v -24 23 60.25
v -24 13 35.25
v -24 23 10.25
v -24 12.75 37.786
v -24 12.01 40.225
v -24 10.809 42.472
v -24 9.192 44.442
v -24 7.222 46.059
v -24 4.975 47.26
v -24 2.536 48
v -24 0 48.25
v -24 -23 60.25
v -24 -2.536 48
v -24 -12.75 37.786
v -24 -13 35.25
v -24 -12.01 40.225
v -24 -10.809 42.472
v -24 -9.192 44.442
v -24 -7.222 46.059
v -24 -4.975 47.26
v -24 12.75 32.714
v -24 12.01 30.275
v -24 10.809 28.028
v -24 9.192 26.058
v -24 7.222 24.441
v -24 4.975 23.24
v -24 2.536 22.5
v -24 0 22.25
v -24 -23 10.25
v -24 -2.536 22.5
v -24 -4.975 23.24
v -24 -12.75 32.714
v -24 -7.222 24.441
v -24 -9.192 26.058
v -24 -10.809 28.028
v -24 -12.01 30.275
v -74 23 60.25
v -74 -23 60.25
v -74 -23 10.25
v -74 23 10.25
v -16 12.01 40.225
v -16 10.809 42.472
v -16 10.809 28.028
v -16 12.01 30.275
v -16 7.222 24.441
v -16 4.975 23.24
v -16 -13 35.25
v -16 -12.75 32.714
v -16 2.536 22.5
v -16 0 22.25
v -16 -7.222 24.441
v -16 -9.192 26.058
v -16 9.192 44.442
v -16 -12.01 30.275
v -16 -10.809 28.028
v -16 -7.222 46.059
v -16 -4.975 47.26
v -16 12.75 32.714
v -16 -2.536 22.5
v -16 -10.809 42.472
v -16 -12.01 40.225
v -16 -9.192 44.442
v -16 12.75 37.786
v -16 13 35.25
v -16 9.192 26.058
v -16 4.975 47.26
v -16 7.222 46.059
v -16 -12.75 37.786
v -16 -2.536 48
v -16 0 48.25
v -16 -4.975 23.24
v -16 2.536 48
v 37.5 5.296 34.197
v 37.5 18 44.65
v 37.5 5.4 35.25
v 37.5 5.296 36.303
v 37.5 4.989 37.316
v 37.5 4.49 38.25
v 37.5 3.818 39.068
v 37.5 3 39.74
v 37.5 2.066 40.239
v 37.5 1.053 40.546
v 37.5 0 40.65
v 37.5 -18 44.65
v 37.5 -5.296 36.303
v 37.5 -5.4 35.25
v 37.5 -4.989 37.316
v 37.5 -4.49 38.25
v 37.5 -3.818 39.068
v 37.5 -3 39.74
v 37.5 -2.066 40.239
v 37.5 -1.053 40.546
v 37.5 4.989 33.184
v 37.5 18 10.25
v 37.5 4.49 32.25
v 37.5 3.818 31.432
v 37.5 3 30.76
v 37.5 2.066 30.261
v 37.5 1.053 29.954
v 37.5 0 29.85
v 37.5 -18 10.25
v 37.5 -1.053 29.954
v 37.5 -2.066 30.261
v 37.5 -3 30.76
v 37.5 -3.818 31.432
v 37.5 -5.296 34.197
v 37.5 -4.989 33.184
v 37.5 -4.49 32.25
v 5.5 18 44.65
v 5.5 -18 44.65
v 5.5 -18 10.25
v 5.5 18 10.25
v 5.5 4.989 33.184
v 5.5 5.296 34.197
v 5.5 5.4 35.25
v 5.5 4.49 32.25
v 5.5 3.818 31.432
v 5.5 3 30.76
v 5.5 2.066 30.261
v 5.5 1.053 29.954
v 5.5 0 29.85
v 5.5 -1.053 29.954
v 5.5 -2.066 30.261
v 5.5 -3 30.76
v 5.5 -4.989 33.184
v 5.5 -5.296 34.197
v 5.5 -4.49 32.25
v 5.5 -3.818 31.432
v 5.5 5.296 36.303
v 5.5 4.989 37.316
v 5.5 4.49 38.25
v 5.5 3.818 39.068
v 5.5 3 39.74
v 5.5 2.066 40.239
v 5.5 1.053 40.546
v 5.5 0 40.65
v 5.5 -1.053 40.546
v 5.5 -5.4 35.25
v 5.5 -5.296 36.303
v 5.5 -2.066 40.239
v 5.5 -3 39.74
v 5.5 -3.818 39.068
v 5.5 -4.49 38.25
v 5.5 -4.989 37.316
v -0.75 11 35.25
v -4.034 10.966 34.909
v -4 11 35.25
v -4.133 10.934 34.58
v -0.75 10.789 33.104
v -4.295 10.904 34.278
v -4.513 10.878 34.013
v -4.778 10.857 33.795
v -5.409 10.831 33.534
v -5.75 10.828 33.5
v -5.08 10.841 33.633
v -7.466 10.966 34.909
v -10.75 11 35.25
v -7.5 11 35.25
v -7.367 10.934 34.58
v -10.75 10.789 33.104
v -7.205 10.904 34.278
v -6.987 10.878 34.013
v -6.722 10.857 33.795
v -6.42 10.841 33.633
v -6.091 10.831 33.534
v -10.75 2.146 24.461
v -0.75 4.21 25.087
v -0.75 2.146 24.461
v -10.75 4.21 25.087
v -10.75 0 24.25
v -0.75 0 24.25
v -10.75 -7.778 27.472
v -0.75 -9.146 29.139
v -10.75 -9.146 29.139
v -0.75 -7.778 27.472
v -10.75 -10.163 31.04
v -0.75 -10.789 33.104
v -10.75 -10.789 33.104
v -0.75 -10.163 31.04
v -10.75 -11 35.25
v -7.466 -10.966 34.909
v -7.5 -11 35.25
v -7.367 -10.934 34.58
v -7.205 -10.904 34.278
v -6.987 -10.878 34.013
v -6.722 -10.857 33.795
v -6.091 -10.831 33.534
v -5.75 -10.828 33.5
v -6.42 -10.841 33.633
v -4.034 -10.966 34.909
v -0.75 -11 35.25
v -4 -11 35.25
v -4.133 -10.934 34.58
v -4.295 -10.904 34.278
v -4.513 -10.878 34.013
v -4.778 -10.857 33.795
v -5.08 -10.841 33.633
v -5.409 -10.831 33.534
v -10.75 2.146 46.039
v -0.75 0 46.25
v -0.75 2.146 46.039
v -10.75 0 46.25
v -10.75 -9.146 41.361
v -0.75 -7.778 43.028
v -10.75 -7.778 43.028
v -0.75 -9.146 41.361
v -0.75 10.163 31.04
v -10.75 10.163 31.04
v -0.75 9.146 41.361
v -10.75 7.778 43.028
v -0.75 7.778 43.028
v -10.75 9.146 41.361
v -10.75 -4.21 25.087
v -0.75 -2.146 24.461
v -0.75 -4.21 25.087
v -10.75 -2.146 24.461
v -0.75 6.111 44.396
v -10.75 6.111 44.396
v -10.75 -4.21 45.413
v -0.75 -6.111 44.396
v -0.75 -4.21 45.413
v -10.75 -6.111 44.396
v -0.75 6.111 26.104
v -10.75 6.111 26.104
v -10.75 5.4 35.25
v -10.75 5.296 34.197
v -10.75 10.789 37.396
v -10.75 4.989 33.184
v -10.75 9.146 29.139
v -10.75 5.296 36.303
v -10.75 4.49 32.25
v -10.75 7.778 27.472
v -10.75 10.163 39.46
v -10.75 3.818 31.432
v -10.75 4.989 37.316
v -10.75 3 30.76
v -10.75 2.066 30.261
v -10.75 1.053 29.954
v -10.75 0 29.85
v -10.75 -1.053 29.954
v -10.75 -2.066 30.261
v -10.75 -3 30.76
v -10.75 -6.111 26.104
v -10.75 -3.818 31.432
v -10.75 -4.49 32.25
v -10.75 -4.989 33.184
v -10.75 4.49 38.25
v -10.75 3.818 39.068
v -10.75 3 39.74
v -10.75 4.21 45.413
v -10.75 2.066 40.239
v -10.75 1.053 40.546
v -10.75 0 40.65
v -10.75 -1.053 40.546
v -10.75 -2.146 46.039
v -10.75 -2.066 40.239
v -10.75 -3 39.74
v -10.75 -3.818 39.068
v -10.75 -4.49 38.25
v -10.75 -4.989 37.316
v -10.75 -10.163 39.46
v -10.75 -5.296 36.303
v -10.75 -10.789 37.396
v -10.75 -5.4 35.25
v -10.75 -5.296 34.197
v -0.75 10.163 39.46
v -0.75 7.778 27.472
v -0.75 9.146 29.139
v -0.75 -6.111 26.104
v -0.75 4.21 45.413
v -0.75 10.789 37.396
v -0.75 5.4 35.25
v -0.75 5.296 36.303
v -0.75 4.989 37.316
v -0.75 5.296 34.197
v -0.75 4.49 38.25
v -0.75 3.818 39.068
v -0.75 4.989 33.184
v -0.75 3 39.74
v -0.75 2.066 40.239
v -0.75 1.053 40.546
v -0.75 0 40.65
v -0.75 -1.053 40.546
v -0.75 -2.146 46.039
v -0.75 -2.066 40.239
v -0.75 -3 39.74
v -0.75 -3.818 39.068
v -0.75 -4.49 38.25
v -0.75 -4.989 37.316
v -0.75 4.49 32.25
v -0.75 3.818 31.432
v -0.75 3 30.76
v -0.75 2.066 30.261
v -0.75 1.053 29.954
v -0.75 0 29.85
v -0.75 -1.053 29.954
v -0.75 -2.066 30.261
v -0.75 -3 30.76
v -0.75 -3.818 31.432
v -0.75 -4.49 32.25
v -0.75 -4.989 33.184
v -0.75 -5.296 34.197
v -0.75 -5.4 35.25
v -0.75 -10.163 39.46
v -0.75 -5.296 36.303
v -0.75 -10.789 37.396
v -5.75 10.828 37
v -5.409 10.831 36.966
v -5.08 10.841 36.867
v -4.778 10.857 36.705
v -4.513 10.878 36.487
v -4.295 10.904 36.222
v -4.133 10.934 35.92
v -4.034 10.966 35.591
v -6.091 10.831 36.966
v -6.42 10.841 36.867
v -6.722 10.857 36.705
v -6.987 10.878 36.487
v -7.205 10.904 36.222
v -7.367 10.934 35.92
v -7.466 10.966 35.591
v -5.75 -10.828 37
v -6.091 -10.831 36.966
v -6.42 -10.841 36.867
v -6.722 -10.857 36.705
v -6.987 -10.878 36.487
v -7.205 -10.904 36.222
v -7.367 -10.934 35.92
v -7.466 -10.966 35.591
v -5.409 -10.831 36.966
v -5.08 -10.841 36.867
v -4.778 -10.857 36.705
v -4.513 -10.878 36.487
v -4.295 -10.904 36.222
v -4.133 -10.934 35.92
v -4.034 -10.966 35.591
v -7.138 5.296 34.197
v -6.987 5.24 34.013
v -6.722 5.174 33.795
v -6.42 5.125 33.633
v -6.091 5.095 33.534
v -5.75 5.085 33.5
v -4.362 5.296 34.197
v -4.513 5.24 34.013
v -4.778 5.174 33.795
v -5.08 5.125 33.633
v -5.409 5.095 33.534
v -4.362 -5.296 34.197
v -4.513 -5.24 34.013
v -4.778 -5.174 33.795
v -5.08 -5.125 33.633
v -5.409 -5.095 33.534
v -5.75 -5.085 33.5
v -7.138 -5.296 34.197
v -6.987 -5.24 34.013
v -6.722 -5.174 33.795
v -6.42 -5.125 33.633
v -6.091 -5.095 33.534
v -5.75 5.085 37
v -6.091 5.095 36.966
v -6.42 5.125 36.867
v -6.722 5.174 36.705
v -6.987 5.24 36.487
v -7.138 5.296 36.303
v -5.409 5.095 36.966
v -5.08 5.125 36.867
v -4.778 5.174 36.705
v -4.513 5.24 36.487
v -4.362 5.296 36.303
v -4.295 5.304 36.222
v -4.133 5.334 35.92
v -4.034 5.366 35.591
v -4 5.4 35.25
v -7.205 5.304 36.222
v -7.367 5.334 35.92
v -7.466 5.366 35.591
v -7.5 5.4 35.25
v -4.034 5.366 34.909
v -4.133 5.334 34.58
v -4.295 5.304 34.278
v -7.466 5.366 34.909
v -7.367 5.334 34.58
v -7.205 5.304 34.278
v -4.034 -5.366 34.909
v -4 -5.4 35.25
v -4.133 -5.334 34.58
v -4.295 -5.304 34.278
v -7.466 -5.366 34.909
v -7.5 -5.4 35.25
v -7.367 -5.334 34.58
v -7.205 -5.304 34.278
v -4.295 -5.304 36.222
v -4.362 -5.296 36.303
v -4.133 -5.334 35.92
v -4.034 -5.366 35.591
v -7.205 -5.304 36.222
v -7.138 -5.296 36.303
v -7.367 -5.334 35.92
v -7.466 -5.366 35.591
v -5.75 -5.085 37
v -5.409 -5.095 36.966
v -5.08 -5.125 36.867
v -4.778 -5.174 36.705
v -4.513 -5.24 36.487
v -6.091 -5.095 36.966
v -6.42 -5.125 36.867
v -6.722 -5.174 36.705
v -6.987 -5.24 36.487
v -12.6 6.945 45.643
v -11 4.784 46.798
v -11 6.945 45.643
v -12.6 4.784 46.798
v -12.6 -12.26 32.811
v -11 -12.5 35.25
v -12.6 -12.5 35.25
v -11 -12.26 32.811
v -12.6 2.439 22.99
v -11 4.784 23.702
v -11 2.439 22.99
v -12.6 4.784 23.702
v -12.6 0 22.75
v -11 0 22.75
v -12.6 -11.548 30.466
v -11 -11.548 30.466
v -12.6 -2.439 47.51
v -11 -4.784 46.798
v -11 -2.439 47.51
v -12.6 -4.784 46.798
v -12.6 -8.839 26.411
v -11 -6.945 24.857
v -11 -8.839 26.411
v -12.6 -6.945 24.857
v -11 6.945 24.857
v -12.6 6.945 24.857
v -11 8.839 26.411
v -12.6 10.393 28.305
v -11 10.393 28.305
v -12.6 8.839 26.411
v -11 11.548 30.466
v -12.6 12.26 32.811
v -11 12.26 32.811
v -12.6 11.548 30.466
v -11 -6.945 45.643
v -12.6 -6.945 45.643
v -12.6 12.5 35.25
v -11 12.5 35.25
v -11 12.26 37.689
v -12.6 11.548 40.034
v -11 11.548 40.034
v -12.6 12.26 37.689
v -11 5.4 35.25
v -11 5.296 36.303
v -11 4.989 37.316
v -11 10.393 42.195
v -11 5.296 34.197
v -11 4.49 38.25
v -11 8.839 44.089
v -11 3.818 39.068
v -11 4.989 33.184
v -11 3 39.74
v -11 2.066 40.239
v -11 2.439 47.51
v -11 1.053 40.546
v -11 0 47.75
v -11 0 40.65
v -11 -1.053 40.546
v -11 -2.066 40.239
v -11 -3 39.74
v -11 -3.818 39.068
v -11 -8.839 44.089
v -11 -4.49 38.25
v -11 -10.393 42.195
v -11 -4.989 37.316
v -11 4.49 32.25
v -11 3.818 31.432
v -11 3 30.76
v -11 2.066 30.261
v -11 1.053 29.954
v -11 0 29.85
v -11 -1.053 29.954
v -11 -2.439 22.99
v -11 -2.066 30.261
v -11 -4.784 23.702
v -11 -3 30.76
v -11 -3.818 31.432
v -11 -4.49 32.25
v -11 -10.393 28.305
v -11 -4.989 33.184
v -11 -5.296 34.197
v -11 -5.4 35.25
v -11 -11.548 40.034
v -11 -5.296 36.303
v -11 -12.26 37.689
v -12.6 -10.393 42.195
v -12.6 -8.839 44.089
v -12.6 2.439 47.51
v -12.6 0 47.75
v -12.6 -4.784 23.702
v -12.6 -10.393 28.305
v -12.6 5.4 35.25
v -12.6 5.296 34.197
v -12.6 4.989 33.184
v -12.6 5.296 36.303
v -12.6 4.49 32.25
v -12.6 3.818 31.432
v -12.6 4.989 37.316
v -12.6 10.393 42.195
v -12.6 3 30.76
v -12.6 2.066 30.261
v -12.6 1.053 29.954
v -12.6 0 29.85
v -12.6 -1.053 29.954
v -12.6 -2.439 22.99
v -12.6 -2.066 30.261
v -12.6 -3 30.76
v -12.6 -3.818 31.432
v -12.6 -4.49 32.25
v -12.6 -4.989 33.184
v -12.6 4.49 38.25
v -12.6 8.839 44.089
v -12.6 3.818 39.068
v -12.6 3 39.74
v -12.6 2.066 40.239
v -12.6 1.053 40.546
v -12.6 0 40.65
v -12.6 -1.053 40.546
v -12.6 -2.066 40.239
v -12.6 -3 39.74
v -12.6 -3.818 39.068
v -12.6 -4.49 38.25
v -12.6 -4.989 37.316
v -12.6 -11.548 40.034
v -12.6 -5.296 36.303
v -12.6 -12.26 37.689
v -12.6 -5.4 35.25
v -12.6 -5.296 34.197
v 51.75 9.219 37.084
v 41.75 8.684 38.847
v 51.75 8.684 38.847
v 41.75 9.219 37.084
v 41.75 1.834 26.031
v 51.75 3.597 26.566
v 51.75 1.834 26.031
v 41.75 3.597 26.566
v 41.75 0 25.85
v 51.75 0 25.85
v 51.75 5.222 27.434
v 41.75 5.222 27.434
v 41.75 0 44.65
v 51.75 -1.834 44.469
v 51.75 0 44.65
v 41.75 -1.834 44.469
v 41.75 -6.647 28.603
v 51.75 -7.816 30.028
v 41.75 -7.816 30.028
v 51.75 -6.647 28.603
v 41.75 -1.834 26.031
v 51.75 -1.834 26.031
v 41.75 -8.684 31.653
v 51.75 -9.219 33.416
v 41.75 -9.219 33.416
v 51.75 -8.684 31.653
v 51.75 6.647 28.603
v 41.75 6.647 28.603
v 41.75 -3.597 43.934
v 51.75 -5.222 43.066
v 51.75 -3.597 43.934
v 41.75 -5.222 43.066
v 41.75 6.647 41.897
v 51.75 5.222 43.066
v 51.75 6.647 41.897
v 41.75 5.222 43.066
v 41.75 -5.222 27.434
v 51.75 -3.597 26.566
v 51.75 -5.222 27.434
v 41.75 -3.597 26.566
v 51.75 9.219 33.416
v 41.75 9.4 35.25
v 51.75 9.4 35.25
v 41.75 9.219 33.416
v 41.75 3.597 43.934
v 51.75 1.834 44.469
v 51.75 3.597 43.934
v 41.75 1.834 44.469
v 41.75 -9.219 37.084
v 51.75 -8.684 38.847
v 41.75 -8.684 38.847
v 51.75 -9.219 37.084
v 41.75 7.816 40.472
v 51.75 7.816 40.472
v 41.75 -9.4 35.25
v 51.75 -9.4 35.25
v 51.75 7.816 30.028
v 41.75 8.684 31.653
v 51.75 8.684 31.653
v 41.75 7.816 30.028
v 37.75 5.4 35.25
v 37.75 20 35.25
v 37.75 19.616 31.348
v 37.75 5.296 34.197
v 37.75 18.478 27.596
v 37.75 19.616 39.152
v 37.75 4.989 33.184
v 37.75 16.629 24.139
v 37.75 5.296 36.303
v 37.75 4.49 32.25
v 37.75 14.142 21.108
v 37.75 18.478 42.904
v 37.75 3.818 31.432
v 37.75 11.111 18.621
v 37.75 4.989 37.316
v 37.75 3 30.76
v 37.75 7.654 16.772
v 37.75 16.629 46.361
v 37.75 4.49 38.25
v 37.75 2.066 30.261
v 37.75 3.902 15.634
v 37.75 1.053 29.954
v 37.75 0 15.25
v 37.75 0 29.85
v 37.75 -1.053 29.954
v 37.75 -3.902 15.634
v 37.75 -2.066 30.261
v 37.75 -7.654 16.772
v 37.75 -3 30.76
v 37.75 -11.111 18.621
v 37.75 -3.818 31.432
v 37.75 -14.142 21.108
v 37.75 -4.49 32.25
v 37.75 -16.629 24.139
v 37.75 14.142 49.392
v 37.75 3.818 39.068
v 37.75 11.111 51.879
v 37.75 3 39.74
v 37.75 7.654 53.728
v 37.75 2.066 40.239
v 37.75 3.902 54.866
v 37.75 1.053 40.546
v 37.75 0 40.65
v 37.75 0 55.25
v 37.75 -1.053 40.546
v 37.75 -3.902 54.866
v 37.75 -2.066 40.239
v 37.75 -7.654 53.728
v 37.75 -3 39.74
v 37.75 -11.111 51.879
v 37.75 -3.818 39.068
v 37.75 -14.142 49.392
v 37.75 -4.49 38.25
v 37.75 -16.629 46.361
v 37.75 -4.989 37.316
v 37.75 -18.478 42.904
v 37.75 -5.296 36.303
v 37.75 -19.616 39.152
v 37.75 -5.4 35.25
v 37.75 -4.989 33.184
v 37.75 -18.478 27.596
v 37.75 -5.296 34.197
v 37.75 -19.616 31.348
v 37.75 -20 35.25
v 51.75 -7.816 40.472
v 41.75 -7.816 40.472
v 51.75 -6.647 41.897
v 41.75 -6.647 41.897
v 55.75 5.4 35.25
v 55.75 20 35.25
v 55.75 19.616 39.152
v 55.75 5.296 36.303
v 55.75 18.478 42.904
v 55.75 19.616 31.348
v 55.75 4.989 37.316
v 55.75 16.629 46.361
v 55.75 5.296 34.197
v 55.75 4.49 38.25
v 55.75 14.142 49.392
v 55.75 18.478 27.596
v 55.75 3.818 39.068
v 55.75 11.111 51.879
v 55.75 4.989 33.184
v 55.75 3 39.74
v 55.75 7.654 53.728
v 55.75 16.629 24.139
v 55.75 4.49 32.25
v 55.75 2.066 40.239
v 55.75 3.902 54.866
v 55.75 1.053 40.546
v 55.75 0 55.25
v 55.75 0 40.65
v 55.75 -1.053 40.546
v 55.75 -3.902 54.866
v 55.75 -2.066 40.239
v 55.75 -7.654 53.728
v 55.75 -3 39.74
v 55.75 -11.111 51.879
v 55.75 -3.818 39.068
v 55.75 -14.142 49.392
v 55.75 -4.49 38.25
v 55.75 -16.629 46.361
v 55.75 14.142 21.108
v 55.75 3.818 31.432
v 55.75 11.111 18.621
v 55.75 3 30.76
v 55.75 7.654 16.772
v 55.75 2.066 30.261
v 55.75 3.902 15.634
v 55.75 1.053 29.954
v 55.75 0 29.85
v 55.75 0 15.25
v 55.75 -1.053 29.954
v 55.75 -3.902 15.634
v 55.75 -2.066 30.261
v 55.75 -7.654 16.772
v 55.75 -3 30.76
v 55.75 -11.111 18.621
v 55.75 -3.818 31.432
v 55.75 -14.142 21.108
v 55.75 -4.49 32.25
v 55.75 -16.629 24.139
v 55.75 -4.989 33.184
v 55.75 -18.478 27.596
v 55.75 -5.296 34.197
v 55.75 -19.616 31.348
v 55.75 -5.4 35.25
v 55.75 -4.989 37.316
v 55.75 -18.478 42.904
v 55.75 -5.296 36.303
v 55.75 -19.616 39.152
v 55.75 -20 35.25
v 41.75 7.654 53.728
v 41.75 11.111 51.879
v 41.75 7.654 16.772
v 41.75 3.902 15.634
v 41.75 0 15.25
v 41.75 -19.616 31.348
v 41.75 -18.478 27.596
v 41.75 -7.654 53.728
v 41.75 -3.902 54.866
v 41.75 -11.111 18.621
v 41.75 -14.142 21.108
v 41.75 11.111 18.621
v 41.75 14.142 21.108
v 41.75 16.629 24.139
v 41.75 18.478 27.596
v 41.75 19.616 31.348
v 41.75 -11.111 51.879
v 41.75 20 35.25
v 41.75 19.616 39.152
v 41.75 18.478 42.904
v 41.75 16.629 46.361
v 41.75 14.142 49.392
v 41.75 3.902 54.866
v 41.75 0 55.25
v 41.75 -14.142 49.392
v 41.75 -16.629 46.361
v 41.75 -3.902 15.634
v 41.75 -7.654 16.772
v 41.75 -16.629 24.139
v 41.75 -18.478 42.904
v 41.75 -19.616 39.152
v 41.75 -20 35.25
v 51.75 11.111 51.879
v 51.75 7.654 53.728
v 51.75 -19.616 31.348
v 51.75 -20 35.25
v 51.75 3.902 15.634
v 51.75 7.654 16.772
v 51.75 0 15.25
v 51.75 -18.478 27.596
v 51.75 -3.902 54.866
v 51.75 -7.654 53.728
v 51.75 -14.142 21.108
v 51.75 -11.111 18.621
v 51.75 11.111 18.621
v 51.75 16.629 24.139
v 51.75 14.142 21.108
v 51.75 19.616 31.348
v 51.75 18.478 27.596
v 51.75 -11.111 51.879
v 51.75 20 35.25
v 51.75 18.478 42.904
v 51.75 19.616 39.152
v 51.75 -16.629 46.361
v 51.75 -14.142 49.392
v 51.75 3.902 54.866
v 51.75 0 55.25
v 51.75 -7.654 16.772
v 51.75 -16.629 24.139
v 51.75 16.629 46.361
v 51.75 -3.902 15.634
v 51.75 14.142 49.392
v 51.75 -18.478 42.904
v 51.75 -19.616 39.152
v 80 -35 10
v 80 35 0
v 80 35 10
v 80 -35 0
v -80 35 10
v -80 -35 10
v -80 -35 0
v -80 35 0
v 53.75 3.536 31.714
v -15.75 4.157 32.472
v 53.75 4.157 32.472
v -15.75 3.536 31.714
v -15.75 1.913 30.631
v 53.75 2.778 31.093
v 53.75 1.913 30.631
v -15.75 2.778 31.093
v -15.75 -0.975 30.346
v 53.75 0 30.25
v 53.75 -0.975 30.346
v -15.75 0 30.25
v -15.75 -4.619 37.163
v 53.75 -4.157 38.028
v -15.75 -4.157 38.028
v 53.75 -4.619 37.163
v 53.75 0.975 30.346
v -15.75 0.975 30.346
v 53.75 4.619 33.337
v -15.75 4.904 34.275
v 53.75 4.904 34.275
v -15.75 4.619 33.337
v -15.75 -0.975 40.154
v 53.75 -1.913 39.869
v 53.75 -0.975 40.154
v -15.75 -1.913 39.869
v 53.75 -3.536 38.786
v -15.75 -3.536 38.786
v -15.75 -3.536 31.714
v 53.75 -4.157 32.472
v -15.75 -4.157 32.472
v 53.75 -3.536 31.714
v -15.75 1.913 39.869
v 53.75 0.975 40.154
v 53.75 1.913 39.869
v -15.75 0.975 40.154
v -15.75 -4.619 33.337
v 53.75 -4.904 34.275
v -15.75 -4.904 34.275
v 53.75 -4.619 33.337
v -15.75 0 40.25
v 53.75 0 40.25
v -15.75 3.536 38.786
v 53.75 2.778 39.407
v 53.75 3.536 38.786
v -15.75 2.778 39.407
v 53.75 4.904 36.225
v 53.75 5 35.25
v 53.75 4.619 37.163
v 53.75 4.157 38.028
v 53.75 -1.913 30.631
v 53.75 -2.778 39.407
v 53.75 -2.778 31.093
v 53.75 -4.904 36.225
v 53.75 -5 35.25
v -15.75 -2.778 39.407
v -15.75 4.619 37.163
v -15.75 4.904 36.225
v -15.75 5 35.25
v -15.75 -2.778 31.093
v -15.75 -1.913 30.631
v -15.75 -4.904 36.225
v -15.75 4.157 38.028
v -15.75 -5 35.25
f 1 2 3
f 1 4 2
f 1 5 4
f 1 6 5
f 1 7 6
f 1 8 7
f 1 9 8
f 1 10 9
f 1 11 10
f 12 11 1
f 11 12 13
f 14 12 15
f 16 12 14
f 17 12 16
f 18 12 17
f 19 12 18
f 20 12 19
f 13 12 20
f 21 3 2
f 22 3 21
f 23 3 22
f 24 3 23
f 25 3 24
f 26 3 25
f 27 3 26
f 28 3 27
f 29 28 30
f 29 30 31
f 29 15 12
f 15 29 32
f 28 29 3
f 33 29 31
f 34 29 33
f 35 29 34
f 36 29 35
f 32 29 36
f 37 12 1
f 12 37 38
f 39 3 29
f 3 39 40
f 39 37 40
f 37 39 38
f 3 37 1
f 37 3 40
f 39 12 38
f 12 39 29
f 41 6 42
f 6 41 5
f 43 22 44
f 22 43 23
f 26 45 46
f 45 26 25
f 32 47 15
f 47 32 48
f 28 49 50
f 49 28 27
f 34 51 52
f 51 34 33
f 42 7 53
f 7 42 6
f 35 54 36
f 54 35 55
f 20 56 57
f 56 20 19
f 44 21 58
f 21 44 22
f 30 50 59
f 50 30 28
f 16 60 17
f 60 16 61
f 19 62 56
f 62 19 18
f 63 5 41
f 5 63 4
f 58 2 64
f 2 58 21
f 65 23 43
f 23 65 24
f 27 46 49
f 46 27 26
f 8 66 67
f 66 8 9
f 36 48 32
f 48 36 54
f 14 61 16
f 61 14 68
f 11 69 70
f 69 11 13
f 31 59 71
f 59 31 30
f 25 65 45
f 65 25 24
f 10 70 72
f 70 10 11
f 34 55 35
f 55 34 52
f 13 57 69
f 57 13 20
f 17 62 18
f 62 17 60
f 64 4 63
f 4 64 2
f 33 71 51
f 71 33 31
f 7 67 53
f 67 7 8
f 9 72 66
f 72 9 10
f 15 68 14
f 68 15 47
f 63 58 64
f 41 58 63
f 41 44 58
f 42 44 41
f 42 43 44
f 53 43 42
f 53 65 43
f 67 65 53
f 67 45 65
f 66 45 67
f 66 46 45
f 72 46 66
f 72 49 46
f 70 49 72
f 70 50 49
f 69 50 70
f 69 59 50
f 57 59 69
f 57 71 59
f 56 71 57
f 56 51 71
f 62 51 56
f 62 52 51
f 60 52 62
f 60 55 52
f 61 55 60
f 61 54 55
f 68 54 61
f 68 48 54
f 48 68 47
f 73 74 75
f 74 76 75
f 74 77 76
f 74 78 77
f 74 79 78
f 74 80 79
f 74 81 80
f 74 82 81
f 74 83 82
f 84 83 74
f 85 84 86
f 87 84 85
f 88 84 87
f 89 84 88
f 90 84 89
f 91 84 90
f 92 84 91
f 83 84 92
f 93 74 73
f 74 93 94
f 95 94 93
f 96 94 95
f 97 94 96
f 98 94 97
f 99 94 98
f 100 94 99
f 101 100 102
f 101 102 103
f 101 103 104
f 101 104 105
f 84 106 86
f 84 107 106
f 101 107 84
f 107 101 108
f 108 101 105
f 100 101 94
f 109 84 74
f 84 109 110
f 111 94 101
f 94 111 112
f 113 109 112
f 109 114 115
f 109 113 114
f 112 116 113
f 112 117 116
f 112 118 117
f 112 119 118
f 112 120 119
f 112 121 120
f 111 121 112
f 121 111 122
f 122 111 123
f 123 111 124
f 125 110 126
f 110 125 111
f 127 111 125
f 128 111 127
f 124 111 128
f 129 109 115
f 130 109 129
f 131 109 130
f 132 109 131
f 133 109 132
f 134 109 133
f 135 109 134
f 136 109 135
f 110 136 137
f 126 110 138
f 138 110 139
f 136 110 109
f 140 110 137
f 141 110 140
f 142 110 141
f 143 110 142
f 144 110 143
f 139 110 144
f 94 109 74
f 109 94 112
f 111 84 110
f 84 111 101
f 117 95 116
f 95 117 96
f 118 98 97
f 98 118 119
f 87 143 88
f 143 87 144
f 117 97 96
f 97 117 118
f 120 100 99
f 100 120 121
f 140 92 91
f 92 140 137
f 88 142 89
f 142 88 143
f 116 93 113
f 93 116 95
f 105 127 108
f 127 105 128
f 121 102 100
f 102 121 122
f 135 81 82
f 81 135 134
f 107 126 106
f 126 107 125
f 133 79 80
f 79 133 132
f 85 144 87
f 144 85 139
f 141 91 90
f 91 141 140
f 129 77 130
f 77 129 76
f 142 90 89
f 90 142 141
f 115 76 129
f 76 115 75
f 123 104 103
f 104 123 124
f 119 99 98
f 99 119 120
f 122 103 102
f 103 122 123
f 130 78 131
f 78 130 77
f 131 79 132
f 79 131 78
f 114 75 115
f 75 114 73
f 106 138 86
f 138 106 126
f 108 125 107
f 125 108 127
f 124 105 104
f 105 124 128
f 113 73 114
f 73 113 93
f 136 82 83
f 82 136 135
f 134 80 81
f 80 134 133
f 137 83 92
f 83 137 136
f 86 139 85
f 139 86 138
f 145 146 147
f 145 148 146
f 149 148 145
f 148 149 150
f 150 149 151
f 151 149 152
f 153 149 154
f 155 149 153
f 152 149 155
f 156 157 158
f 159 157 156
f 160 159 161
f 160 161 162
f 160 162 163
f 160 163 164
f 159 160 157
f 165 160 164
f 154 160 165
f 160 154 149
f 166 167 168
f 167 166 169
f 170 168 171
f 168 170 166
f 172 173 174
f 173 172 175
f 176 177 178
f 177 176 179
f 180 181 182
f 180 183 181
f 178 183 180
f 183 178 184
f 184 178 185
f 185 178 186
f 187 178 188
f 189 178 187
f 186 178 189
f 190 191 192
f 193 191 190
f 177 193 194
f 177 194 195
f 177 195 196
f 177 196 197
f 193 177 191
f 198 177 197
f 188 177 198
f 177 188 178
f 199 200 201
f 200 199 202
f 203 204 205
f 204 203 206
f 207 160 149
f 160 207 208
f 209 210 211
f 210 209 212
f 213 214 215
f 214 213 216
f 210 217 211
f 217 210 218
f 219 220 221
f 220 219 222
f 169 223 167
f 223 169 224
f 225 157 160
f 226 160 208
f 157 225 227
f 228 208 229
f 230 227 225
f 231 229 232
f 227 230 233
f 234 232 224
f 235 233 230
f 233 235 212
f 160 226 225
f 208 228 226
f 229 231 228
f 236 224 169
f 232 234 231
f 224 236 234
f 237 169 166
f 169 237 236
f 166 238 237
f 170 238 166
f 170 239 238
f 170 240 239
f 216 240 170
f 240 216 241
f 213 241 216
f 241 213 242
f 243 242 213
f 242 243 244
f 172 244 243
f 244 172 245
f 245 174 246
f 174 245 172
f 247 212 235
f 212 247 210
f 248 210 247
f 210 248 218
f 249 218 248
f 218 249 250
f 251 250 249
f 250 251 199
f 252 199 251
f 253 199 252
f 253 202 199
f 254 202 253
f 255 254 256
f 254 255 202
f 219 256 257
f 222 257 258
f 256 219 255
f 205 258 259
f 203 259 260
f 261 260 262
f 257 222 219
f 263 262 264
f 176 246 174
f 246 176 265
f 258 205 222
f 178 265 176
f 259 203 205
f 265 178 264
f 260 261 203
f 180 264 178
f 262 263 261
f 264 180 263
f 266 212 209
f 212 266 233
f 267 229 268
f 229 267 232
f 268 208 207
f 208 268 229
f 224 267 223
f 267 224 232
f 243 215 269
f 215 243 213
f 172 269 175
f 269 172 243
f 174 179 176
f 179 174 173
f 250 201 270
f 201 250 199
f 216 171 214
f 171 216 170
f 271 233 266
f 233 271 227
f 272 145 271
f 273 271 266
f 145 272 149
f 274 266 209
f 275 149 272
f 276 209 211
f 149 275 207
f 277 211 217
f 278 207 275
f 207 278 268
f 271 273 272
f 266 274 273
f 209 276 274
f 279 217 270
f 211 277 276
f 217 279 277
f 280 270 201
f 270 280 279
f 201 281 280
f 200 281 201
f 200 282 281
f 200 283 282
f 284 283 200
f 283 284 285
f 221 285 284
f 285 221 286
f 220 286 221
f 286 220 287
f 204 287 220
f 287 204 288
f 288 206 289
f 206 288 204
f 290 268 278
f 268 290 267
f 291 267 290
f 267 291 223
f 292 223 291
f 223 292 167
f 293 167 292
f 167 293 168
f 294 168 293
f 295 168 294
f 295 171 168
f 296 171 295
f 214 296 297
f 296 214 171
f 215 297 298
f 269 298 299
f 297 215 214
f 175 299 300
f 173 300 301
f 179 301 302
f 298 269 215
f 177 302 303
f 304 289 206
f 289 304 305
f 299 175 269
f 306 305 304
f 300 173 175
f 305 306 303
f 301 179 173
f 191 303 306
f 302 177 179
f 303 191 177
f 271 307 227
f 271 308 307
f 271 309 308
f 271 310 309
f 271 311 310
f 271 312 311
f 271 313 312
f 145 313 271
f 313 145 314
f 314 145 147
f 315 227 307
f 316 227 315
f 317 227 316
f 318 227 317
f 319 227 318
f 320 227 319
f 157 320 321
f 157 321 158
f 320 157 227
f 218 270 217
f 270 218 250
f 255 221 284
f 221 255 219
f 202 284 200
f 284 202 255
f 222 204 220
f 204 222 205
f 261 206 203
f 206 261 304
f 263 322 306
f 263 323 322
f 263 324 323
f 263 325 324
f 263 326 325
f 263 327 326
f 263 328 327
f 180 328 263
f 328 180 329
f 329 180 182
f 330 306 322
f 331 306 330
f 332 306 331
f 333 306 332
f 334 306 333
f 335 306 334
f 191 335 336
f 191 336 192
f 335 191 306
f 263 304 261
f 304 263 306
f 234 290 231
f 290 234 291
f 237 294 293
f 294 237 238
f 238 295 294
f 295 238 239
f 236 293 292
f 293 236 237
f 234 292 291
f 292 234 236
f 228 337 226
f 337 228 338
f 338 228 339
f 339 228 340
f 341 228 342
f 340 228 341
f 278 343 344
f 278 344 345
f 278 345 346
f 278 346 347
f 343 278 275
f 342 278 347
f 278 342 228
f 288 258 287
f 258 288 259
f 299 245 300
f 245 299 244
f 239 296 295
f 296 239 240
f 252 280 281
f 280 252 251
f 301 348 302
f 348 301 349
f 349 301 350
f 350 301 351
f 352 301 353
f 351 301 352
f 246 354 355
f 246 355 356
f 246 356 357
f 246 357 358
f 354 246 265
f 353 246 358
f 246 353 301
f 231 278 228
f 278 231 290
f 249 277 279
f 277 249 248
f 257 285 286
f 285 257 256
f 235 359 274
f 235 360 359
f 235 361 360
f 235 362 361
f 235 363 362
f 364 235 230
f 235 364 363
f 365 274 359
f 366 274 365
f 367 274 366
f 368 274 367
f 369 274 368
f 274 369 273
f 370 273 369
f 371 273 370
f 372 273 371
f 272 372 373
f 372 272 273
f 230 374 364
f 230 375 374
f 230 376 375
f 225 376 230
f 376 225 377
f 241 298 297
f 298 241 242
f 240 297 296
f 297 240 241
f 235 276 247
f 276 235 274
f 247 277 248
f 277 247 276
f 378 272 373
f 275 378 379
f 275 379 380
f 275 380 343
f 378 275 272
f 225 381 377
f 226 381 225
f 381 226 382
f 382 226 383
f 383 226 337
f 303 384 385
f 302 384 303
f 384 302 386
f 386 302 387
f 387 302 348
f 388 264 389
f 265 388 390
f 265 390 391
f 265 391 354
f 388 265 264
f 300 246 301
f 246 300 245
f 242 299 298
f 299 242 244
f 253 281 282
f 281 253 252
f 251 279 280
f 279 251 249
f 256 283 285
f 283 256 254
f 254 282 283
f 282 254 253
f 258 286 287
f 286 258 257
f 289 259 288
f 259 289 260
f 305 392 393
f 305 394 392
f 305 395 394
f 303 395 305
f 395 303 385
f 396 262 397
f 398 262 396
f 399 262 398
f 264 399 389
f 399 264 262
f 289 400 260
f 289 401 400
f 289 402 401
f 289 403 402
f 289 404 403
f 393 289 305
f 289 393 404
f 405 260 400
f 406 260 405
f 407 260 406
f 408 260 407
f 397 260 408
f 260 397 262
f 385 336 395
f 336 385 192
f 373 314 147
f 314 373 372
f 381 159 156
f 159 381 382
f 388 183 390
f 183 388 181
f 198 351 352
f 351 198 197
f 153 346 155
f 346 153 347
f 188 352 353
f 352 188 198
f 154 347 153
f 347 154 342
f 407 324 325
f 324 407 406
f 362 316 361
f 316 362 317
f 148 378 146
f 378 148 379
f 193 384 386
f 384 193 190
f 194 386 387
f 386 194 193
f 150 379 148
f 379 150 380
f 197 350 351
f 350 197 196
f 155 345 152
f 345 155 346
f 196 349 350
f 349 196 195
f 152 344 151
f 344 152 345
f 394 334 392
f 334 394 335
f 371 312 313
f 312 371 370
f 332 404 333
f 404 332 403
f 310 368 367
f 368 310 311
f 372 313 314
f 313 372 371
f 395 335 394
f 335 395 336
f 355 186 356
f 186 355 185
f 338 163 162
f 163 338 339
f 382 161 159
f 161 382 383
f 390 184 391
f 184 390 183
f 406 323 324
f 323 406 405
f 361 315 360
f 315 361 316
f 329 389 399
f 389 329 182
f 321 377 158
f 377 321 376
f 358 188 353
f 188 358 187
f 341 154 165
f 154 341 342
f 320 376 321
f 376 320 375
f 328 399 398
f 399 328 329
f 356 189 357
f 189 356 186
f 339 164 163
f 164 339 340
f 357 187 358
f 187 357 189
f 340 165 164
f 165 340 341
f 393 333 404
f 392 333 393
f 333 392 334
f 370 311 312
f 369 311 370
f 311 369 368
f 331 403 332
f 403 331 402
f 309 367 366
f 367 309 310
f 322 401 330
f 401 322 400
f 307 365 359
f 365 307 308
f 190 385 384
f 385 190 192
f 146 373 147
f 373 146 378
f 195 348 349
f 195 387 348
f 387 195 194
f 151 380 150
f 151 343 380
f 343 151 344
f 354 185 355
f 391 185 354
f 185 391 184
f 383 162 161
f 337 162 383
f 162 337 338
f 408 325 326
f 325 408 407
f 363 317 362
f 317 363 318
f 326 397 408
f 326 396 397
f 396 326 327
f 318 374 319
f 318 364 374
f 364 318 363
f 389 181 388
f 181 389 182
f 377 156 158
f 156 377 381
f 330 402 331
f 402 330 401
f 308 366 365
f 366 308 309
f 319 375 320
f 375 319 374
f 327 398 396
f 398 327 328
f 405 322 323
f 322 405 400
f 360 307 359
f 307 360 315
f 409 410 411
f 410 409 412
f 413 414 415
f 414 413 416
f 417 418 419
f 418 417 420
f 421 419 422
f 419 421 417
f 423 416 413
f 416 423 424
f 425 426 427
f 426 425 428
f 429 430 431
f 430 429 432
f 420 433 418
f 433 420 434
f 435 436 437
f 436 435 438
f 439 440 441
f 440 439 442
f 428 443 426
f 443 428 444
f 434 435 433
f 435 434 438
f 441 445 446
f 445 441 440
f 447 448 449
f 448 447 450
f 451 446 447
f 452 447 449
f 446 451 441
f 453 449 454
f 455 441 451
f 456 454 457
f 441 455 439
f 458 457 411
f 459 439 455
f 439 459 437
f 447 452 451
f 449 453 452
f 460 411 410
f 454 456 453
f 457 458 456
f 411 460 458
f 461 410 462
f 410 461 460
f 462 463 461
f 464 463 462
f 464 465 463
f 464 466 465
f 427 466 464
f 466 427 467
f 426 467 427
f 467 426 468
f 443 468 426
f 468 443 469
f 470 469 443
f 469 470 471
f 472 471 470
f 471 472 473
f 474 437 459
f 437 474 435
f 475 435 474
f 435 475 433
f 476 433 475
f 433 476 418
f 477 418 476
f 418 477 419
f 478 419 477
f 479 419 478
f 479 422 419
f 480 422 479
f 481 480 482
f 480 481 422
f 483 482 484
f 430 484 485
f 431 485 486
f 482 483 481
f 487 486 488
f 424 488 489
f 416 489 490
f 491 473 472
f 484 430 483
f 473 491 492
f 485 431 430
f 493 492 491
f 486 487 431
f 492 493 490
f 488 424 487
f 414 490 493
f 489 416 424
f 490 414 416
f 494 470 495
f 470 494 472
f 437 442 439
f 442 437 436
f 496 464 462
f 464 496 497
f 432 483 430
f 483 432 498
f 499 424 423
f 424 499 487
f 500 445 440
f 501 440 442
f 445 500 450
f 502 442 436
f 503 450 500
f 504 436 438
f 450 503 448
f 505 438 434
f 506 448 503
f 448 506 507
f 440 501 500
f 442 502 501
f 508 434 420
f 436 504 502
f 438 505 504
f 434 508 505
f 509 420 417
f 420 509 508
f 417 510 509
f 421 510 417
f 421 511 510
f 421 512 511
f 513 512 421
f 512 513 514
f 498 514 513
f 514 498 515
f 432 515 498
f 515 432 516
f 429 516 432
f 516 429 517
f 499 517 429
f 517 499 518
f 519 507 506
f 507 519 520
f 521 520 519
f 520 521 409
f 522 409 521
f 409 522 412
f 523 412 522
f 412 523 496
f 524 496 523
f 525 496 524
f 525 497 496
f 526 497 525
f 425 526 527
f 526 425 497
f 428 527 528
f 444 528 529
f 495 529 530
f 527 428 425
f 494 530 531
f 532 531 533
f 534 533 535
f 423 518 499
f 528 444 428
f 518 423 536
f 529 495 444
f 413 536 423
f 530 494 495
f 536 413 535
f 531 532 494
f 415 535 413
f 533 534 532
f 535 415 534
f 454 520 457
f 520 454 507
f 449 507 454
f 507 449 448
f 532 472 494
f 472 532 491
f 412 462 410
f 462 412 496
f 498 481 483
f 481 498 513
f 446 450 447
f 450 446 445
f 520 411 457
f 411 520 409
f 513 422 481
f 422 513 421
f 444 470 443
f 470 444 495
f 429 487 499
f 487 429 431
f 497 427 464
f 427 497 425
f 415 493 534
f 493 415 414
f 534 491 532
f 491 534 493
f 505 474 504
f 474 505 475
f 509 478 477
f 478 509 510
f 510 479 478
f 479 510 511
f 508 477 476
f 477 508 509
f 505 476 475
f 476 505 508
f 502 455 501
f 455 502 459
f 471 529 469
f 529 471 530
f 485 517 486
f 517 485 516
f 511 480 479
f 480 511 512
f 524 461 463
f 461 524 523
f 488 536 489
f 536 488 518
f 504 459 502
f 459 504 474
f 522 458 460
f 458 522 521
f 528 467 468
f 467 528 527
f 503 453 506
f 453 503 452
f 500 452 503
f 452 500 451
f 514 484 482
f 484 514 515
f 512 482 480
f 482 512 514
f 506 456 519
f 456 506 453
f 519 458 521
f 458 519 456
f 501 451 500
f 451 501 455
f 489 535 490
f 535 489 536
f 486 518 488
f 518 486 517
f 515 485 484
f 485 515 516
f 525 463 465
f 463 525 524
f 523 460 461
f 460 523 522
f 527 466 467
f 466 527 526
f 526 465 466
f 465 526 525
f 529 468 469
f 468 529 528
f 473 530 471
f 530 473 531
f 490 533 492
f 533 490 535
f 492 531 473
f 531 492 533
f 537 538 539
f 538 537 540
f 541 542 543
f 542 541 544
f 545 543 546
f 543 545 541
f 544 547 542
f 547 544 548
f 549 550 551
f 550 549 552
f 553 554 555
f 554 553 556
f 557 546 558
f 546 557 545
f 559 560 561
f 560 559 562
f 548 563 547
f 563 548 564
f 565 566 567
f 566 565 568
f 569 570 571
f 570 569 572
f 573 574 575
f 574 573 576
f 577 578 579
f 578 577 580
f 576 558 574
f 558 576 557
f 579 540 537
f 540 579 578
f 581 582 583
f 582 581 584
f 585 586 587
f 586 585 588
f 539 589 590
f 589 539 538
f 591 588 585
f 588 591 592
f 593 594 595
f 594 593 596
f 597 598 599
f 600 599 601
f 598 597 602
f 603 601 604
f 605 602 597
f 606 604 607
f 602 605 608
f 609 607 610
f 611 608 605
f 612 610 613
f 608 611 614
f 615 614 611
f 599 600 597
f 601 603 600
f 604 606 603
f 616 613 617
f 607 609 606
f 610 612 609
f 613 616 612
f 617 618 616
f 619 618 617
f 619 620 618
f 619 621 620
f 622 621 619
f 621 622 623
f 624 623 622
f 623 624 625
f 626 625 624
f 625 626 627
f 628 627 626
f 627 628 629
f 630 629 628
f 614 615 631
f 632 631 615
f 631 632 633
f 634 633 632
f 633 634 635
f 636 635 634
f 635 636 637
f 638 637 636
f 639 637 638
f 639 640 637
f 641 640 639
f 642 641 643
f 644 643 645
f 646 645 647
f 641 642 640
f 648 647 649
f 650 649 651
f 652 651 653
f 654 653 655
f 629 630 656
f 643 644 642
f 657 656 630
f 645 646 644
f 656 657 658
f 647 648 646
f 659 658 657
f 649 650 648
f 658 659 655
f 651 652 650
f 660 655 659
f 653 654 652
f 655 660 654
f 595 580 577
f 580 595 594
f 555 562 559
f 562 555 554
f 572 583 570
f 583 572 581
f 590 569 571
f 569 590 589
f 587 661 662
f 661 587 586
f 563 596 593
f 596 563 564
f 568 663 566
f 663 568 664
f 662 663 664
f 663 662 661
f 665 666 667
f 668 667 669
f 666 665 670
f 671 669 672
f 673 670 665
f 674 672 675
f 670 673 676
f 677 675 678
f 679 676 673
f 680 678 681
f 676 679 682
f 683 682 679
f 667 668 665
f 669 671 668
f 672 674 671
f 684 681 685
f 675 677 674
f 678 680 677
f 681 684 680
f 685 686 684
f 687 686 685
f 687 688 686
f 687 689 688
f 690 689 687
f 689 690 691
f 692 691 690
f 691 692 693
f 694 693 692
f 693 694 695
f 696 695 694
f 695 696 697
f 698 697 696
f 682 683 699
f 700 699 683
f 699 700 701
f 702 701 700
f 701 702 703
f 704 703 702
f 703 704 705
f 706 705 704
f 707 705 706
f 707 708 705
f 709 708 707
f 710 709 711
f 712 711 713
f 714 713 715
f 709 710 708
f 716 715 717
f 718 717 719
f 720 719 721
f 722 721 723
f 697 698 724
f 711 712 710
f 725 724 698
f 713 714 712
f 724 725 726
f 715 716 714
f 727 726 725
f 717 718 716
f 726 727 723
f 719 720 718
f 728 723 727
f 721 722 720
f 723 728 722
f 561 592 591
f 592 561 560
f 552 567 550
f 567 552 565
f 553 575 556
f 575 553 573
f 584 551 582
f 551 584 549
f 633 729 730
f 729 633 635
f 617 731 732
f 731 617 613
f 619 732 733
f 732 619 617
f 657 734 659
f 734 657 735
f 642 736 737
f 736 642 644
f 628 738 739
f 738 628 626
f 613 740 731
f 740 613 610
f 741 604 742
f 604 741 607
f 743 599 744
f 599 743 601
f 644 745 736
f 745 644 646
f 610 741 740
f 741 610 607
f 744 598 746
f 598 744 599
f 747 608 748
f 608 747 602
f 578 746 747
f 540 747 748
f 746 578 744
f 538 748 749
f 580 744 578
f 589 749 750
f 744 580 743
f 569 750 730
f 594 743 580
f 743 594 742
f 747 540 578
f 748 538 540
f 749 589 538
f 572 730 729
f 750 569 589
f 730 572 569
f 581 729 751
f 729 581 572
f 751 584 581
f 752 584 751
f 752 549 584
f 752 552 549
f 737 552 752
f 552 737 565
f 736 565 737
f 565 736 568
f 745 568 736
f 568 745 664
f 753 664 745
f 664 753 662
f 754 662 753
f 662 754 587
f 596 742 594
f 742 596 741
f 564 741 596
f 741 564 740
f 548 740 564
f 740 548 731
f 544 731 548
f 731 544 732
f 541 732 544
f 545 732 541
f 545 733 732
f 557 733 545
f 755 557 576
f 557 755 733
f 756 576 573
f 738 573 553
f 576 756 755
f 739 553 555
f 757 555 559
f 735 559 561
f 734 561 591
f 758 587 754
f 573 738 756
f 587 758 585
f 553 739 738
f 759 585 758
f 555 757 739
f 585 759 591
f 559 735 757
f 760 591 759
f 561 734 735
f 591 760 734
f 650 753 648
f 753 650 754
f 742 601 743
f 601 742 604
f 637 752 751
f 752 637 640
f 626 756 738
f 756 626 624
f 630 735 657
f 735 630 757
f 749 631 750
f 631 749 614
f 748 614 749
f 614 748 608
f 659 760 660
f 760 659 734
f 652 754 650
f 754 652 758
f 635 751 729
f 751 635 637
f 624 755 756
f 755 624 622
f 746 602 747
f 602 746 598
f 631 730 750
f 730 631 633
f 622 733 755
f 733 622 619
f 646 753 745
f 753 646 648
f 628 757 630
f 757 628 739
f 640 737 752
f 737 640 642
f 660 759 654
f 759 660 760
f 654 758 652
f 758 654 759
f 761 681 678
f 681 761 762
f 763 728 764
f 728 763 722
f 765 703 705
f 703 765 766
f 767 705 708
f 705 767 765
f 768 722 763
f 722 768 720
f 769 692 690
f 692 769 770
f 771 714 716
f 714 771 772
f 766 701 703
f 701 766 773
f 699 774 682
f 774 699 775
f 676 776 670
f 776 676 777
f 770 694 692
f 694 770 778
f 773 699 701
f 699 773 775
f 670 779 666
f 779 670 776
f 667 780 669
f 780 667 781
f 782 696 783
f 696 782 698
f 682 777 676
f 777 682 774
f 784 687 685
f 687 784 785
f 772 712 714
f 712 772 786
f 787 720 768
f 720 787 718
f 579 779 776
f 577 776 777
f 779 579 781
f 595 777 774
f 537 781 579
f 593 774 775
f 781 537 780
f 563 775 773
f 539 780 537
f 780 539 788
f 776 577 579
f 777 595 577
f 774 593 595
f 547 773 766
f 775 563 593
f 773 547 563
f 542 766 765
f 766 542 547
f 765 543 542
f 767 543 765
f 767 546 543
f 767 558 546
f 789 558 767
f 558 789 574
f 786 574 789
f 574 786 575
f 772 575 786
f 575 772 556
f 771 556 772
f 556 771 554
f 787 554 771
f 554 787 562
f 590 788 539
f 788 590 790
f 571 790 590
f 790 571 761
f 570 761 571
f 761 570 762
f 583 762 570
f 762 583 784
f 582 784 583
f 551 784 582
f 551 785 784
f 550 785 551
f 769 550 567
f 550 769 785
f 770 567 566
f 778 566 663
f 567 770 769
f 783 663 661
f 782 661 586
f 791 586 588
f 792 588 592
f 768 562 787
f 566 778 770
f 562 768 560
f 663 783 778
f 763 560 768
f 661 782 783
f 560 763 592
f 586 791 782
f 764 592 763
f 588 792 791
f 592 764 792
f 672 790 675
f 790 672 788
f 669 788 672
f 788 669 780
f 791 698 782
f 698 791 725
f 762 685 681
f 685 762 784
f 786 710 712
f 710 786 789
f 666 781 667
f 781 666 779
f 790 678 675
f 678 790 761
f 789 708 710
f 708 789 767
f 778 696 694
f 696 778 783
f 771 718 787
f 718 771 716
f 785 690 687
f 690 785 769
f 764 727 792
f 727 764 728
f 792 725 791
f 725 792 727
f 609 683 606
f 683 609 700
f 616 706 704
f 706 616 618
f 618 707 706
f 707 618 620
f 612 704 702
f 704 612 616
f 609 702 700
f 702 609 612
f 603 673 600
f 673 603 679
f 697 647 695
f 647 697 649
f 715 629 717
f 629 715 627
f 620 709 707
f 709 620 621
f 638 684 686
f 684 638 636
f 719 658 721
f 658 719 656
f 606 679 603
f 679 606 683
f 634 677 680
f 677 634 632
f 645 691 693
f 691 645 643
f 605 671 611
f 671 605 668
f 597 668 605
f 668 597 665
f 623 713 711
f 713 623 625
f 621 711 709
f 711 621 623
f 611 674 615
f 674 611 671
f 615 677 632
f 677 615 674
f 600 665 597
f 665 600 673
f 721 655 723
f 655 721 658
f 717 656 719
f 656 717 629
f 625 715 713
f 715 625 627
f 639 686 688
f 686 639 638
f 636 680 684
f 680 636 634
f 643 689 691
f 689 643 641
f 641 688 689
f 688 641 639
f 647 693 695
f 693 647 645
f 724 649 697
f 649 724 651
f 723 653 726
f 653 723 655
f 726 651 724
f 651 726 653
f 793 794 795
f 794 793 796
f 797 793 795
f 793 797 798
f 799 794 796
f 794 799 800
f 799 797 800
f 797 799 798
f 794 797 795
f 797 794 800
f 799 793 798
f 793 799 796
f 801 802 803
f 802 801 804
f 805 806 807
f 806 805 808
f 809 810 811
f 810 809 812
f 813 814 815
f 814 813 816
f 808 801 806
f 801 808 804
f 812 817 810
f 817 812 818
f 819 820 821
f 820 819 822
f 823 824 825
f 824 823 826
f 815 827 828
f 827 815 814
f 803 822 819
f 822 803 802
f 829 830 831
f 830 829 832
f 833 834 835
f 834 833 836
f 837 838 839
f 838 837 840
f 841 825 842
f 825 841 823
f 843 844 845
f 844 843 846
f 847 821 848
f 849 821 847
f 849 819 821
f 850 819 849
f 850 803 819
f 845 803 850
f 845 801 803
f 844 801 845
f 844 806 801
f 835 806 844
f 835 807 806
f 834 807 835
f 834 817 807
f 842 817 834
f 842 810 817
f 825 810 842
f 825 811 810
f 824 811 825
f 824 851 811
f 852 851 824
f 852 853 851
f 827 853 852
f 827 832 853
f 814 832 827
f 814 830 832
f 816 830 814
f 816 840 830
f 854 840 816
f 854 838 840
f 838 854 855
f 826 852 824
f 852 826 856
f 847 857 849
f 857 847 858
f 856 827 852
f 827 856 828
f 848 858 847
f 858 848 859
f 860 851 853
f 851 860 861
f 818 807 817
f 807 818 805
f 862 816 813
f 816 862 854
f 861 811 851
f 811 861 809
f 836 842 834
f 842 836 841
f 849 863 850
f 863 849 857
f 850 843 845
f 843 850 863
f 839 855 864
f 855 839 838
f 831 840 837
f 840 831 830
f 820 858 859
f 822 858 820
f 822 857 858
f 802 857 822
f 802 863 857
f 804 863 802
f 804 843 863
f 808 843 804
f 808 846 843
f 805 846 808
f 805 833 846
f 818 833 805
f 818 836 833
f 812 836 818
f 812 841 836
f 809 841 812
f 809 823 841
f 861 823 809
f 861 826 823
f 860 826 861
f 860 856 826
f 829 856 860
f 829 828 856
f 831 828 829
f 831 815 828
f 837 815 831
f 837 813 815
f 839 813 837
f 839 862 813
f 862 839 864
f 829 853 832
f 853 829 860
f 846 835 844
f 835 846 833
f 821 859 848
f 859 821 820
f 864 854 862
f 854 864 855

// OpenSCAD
$fn = 32;

// ------------------------------------------------------------------------
// Motor drive station: motor 50 x 50 mm, shaft d10, pulley d40
// Every part is its own module, assembly() places every instance.
// ------------------------------------------------------------------------

// --- part 1 ---
module station_bed() {
  difference() {
    translate([-80, -35, 0]) cube([160, 70, 10]);
  }
}

// --- part 2 ---
module drive_motor() {
  union() {
    translate([-25, -23, 0]) cube([50, 46, 50]);
    translate([29, 0, 25]) rotate([0, 90, 0]) cylinder(h = 8, d = 26, center = true);
  }
}

// --- part 3 ---
module pillow_block() {
  difference() {
    translate([-16, -18, 0]) cube([32, 36, 34.4]);
    translate([0, 0, 25]) rotate([0, 90, 0]) cylinder(h = 34, d = 10.8, center = true);
  }
}

// --- part 4 ---
module drive_shaft() {
  translate([0, 0, -34.75]) cylinder(h = 69.5, d = 10);
}

// --- part 5 ---
module shaft_collar() {
  difference() {
    cylinder(h = 10, d = 22);
    translate([0, 0, -1]) cylinder(h = 12, d = 10.8);
    translate([0, 0, 5]) rotate([90, 0, 0]) cylinder(h = 24, d = 3.5, center = true);
  }
}

// --- part 6 ---
module collar_washer() {
  difference() {
      translate([0, 0, 0]) cylinder(h = 1.6, d = 25);
      translate([0, 0, -1]) cylinder(h = 3.6, d = 10.8);
    }
}

// --- part 7 ---
module drive_pulley() {
  difference() {
    union() {
      cylinder(h = 18, d = 18.8);
      cylinder(h = 4, d = 40);
      translate([0, 0, 14]) cylinder(h = 4, d = 40);
    }
    translate([0, 0, -1]) cylinder(h = 20, d = 10.8);
  }
}

// --- assembly ---
module assembly() {
  color([0.80, 0.24, 0.20]) translate([0, 0, 0]) rotate([0, 0, 0]) station_bed();
  color([0.20, 0.45, 0.75]) translate([-49, 0, 10.25]) rotate([0, 0, 0]) drive_motor();
  color([0.25, 0.62, 0.32]) translate([21.5, 0, 10.25]) rotate([0, 0, 0]) pillow_block();
  color([0.92, 0.70, 0.18]) translate([19, 0, 35.25]) rotate([0, 90, 0]) drive_shaft();
  color([0.58, 0.35, 0.70]) translate([-10.75, 0, 35.25]) rotate([0, 90, 0]) shaft_collar();
  color([0.16, 0.66, 0.66]) translate([-12.6, 0, 35.25]) rotate([0, 90, 0]) collar_washer();
  color([0.85, 0.48, 0.18]) translate([37.75, 0, 35.25]) rotate([0, 90, 0]) drive_pulley();
}

assembly();
